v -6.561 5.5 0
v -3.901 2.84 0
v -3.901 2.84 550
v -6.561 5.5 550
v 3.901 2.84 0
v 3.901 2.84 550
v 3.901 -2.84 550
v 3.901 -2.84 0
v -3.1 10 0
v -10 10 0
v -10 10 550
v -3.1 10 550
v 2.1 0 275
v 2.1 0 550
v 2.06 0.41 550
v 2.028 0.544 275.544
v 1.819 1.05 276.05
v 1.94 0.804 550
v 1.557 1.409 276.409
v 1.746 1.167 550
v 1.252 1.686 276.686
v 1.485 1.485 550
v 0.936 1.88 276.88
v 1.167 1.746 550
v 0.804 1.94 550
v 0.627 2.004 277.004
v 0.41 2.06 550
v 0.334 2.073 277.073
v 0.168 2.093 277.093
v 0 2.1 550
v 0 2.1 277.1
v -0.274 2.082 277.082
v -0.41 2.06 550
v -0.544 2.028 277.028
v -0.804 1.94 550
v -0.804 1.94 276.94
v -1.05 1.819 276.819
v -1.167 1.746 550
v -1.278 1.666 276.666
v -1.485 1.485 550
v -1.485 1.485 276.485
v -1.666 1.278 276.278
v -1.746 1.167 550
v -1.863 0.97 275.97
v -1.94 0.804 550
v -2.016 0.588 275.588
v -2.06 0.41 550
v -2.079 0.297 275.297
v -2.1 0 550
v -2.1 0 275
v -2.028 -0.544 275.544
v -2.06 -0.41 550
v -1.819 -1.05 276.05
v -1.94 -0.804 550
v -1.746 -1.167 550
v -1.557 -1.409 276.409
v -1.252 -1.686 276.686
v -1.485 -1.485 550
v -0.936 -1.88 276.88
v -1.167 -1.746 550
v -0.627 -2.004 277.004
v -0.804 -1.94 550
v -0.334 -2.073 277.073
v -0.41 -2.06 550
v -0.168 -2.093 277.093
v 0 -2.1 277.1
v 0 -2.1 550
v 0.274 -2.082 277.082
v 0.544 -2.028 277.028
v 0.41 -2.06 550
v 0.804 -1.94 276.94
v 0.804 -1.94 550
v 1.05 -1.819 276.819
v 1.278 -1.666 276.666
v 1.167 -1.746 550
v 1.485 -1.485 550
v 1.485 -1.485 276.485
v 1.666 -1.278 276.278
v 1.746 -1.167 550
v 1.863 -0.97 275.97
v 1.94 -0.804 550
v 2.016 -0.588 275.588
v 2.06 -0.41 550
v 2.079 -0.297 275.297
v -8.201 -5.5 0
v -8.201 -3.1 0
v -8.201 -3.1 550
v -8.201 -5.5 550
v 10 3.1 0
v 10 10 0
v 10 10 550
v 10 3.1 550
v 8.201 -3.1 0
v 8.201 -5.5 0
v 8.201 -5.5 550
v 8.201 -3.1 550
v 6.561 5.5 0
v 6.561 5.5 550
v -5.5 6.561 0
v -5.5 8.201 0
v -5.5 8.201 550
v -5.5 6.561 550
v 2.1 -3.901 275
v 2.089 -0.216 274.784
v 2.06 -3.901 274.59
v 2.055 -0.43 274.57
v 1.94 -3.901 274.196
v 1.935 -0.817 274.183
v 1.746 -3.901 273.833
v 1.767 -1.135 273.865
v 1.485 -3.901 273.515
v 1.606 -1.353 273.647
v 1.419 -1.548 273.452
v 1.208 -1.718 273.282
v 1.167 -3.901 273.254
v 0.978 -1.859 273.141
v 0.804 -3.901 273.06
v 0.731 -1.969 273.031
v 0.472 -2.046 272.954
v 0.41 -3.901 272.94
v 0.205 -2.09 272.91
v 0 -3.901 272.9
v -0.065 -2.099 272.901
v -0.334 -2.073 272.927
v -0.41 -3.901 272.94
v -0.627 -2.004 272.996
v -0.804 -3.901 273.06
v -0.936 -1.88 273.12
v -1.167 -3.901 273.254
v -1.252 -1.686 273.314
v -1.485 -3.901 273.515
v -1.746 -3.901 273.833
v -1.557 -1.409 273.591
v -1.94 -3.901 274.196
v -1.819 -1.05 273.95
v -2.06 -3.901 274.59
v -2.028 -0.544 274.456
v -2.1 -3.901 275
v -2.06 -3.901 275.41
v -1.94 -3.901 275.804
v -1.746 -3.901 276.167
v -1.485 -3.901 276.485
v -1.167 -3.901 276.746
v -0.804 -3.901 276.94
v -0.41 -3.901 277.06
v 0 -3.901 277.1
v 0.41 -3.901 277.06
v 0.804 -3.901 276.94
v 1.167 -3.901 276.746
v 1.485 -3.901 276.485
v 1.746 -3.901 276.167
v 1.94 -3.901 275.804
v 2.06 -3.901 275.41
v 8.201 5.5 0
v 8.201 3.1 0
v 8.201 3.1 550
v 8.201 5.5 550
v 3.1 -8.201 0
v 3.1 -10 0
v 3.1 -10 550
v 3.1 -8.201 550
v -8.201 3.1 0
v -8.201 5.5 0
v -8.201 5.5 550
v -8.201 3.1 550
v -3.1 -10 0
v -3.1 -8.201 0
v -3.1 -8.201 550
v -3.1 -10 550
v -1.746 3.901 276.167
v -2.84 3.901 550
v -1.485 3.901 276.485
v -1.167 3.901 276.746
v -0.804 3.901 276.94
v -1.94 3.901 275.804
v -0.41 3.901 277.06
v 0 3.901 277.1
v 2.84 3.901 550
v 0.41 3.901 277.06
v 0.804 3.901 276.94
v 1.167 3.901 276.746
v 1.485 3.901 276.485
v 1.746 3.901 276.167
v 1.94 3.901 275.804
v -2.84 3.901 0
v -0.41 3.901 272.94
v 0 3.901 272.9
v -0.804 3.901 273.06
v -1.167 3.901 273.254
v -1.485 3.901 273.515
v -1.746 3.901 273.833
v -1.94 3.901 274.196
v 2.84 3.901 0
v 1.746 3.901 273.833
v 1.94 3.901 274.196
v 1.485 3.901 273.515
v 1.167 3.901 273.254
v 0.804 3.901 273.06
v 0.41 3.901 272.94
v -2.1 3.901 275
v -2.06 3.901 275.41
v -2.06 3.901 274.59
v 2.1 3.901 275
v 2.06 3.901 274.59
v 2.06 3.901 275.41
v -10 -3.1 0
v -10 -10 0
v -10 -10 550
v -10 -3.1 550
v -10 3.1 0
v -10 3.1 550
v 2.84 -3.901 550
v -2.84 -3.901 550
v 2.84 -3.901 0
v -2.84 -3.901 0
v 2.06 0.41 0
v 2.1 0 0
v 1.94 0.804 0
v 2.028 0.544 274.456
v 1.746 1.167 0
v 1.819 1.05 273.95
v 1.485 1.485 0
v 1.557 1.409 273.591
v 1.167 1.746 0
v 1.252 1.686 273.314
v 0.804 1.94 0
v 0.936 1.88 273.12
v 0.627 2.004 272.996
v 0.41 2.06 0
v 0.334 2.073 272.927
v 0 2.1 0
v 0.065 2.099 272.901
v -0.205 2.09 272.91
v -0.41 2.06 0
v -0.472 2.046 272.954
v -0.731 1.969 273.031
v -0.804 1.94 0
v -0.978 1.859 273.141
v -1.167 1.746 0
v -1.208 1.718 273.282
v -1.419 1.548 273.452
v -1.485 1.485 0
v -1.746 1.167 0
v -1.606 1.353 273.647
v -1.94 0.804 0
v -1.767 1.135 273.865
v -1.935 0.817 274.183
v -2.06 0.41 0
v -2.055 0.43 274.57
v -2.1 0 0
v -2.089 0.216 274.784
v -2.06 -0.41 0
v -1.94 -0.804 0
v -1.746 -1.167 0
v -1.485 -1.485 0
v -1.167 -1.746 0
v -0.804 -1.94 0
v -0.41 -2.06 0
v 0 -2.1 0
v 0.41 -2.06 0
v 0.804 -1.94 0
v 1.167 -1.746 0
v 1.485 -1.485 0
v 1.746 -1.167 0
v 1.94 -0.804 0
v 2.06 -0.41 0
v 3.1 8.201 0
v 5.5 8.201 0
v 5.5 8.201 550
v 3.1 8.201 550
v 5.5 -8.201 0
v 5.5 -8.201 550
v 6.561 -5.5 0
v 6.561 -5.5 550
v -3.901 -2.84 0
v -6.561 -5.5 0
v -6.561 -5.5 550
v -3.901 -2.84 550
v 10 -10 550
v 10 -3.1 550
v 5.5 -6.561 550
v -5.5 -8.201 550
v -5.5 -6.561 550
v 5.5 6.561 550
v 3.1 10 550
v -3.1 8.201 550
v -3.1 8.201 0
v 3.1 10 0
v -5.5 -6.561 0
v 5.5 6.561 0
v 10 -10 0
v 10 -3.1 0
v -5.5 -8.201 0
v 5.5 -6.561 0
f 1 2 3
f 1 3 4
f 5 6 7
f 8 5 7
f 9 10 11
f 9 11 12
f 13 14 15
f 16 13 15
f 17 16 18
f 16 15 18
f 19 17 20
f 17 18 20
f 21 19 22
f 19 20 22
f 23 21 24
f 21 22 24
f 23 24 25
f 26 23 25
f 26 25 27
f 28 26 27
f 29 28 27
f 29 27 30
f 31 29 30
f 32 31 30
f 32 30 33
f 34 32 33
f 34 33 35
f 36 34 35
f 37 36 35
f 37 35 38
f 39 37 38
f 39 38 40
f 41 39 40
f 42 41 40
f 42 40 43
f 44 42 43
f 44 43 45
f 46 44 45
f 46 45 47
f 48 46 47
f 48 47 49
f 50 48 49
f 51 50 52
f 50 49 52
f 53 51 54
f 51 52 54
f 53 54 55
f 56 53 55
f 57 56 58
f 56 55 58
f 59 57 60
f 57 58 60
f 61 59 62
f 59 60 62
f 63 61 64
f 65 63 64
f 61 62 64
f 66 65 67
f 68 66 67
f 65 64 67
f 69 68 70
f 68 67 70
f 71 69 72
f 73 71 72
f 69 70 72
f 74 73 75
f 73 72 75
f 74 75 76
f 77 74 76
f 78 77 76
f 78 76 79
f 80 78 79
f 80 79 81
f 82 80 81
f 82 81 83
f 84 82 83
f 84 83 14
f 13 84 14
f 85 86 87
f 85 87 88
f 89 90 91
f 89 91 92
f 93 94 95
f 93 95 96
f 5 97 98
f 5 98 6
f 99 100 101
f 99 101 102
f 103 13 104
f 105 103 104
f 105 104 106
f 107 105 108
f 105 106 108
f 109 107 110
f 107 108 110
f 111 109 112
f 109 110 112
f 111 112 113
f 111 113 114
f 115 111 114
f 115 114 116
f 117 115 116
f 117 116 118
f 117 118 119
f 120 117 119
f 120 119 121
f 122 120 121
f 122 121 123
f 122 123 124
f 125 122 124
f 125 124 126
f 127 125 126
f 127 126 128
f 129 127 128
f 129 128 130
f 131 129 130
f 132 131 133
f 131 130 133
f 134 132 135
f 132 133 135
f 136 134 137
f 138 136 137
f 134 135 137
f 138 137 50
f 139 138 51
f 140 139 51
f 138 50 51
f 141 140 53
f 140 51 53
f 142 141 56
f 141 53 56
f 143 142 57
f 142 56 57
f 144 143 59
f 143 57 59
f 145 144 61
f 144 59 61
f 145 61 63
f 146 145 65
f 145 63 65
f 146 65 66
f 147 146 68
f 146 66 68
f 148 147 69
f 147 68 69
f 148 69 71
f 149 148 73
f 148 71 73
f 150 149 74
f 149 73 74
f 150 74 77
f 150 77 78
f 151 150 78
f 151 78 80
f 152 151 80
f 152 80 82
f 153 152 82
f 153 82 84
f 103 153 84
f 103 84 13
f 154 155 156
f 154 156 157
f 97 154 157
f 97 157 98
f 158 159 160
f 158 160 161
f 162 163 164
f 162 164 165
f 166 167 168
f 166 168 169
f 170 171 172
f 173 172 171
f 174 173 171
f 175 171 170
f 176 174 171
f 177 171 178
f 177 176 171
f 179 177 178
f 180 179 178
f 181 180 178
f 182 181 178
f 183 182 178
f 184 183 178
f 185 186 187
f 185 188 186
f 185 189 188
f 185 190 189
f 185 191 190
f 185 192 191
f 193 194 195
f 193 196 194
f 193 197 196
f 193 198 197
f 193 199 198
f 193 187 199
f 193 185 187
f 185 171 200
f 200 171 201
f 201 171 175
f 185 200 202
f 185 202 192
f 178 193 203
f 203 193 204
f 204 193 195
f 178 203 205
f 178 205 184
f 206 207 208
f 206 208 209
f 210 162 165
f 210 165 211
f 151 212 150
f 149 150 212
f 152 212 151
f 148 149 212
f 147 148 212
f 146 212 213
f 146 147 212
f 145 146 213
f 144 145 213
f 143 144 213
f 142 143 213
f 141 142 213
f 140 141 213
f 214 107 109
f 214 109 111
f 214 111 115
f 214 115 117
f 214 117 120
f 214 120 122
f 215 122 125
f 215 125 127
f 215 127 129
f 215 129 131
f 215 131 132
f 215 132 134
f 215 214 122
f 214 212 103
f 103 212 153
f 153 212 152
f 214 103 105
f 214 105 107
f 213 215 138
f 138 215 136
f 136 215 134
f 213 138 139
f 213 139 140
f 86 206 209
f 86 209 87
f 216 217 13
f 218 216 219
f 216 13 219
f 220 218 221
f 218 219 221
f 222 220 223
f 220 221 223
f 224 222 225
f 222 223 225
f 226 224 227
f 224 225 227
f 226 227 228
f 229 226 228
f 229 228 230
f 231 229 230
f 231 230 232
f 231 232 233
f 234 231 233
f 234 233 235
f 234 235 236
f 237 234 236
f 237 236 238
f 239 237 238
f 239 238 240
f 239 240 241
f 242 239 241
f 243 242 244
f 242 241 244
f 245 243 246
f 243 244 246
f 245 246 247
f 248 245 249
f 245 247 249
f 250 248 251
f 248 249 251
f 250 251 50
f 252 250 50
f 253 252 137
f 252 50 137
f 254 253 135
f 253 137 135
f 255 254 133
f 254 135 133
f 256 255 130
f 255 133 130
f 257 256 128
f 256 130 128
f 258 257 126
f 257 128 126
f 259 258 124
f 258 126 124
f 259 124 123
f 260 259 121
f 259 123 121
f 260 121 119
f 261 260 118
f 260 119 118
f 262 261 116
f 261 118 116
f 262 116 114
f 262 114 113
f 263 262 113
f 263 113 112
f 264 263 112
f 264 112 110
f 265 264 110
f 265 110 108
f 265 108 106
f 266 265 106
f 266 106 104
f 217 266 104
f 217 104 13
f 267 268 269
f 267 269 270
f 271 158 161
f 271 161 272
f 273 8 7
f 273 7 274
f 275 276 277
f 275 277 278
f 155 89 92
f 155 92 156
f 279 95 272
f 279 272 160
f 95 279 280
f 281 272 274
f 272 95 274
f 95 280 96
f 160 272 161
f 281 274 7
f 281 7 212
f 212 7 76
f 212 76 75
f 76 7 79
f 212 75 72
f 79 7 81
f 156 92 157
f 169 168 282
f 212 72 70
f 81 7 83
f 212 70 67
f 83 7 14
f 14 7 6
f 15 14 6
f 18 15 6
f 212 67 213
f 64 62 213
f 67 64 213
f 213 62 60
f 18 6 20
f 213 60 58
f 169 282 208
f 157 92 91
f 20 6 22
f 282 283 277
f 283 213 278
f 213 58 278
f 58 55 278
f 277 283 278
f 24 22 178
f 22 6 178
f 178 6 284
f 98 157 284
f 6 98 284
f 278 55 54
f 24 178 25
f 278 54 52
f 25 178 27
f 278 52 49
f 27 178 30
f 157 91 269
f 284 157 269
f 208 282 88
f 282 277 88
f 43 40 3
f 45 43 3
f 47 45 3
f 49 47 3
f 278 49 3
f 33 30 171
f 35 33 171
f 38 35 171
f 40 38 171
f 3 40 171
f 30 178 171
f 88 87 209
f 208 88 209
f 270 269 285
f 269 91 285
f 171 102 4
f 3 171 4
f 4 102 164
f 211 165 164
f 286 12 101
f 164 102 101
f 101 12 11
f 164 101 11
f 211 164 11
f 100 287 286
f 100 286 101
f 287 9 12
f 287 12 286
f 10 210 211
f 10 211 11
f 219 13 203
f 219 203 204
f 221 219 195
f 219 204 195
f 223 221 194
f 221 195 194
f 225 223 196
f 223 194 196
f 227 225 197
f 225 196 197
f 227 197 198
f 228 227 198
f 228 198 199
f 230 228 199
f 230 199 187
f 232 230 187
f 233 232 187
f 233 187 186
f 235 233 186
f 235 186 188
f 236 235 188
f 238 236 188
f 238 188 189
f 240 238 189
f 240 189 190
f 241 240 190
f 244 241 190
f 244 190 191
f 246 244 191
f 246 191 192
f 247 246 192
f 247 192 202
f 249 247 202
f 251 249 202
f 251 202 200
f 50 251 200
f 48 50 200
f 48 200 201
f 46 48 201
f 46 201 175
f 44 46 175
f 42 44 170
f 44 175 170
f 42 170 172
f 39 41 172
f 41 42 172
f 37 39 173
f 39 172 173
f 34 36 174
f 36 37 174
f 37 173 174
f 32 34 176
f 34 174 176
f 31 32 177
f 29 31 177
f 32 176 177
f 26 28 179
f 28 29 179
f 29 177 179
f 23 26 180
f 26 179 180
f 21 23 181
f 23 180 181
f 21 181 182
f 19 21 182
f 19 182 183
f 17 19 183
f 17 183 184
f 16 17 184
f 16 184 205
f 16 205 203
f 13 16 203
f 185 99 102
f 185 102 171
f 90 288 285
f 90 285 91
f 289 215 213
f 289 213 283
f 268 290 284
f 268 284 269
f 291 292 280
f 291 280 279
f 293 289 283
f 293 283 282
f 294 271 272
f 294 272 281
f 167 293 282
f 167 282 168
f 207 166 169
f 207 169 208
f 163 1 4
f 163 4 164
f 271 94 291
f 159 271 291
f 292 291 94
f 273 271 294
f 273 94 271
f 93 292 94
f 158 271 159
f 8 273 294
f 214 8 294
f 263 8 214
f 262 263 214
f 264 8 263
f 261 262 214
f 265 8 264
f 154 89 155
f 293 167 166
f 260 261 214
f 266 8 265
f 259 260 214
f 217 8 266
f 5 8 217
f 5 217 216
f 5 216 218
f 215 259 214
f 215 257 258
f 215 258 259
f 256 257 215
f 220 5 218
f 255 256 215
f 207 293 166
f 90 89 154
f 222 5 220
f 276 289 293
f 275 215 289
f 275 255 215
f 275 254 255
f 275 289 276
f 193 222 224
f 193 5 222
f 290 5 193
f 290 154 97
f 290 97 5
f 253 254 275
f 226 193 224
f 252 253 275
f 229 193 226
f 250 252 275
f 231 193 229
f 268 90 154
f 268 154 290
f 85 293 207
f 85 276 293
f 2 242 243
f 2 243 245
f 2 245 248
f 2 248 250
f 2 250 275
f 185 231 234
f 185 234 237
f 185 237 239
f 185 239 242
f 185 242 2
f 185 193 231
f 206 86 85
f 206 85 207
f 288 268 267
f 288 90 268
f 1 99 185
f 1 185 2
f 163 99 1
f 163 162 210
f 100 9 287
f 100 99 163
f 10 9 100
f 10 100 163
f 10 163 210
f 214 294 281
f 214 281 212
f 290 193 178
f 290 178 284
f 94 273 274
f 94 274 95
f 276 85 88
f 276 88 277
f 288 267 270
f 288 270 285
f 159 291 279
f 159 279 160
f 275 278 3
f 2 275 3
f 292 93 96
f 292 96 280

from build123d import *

# Parameters (mm, degrees)
BOSS_EXTRUDE1_DEPTH = 550
SKETCH2_R           = 2.1
CUT_EXTRUDE1_DEPTH  = 551
SKETCH3_R           = 2.1
CUT_EXTRUDE2_DEPTH  = 14.900660172


with BuildPart() as part:
    # Sketch1 → Boss-Extrude1 (new body)
    with BuildSketch(Plane.XY):
        Polygon((-3.1, 10), (-3.1, 8.200660172), (-5.5, 8.200660172), (-5.5, 6.560660172), (-2.84, 3.900660172), (2.84, 3.900660172), (5.5, 6.560660172), (5.5, 8.200660172), (3.1, 8.200660172), (3.1, 10), (10, 10), (10, 3.1), (8.200660172, 3.1), (8.200660172, 5.5), (6.560660172, 5.5), (3.900660172, 2.84), (3.900660172, -2.84), (6.560660172, -5.5), (8.200660172, -5.5), (8.200660172, -3.1), (10, -3.1), (10, -10), (3.1, -10), (3.1, -8.200660172), (5.5, -8.200660172), (5.5, -6.560660172), (2.84, -3.900660172), (-2.84, -3.900660172), (-5.5, -6.560660172), (-5.5, -8.200660172), (-3.1, -8.200660172), (-3.1, -10), (-10, -10), (-10, -3.1), (-8.200660172, -3.1), (-8.200660172, -5.5), (-6.560660172, -5.5), (-3.900660172, -2.84), (-3.900660172, 2.84), (-6.560660172, 5.5), (-8.200660172, 5.5), (-8.200660172, 3.1), (-10, 3.1), (-10, 10), align=None)
    extrude(amount=BOSS_EXTRUDE1_DEPTH)

    # Sketch2 → Cut-Extrude1 (cut, through all)
    with BuildSketch(Plane.XY.offset(550)):
        Circle(SKETCH2_R)
    extrude(amount=-CUT_EXTRUDE1_DEPTH, mode=Mode.SUBTRACT)

    # Sketch3 → Cut-Extrude2 (cut, through all)
    with BuildSketch(Plane(origin=(0, 3.900660172, 0), x_dir=(1, 0, 0), z_dir=(0, 1, 0))):
        with Locations((0, -275)):
            Circle(SKETCH3_R)
    extrude(amount=-CUT_EXTRUDE2_DEPTH, mode=Mode.SUBTRACT)


solid = part.part
